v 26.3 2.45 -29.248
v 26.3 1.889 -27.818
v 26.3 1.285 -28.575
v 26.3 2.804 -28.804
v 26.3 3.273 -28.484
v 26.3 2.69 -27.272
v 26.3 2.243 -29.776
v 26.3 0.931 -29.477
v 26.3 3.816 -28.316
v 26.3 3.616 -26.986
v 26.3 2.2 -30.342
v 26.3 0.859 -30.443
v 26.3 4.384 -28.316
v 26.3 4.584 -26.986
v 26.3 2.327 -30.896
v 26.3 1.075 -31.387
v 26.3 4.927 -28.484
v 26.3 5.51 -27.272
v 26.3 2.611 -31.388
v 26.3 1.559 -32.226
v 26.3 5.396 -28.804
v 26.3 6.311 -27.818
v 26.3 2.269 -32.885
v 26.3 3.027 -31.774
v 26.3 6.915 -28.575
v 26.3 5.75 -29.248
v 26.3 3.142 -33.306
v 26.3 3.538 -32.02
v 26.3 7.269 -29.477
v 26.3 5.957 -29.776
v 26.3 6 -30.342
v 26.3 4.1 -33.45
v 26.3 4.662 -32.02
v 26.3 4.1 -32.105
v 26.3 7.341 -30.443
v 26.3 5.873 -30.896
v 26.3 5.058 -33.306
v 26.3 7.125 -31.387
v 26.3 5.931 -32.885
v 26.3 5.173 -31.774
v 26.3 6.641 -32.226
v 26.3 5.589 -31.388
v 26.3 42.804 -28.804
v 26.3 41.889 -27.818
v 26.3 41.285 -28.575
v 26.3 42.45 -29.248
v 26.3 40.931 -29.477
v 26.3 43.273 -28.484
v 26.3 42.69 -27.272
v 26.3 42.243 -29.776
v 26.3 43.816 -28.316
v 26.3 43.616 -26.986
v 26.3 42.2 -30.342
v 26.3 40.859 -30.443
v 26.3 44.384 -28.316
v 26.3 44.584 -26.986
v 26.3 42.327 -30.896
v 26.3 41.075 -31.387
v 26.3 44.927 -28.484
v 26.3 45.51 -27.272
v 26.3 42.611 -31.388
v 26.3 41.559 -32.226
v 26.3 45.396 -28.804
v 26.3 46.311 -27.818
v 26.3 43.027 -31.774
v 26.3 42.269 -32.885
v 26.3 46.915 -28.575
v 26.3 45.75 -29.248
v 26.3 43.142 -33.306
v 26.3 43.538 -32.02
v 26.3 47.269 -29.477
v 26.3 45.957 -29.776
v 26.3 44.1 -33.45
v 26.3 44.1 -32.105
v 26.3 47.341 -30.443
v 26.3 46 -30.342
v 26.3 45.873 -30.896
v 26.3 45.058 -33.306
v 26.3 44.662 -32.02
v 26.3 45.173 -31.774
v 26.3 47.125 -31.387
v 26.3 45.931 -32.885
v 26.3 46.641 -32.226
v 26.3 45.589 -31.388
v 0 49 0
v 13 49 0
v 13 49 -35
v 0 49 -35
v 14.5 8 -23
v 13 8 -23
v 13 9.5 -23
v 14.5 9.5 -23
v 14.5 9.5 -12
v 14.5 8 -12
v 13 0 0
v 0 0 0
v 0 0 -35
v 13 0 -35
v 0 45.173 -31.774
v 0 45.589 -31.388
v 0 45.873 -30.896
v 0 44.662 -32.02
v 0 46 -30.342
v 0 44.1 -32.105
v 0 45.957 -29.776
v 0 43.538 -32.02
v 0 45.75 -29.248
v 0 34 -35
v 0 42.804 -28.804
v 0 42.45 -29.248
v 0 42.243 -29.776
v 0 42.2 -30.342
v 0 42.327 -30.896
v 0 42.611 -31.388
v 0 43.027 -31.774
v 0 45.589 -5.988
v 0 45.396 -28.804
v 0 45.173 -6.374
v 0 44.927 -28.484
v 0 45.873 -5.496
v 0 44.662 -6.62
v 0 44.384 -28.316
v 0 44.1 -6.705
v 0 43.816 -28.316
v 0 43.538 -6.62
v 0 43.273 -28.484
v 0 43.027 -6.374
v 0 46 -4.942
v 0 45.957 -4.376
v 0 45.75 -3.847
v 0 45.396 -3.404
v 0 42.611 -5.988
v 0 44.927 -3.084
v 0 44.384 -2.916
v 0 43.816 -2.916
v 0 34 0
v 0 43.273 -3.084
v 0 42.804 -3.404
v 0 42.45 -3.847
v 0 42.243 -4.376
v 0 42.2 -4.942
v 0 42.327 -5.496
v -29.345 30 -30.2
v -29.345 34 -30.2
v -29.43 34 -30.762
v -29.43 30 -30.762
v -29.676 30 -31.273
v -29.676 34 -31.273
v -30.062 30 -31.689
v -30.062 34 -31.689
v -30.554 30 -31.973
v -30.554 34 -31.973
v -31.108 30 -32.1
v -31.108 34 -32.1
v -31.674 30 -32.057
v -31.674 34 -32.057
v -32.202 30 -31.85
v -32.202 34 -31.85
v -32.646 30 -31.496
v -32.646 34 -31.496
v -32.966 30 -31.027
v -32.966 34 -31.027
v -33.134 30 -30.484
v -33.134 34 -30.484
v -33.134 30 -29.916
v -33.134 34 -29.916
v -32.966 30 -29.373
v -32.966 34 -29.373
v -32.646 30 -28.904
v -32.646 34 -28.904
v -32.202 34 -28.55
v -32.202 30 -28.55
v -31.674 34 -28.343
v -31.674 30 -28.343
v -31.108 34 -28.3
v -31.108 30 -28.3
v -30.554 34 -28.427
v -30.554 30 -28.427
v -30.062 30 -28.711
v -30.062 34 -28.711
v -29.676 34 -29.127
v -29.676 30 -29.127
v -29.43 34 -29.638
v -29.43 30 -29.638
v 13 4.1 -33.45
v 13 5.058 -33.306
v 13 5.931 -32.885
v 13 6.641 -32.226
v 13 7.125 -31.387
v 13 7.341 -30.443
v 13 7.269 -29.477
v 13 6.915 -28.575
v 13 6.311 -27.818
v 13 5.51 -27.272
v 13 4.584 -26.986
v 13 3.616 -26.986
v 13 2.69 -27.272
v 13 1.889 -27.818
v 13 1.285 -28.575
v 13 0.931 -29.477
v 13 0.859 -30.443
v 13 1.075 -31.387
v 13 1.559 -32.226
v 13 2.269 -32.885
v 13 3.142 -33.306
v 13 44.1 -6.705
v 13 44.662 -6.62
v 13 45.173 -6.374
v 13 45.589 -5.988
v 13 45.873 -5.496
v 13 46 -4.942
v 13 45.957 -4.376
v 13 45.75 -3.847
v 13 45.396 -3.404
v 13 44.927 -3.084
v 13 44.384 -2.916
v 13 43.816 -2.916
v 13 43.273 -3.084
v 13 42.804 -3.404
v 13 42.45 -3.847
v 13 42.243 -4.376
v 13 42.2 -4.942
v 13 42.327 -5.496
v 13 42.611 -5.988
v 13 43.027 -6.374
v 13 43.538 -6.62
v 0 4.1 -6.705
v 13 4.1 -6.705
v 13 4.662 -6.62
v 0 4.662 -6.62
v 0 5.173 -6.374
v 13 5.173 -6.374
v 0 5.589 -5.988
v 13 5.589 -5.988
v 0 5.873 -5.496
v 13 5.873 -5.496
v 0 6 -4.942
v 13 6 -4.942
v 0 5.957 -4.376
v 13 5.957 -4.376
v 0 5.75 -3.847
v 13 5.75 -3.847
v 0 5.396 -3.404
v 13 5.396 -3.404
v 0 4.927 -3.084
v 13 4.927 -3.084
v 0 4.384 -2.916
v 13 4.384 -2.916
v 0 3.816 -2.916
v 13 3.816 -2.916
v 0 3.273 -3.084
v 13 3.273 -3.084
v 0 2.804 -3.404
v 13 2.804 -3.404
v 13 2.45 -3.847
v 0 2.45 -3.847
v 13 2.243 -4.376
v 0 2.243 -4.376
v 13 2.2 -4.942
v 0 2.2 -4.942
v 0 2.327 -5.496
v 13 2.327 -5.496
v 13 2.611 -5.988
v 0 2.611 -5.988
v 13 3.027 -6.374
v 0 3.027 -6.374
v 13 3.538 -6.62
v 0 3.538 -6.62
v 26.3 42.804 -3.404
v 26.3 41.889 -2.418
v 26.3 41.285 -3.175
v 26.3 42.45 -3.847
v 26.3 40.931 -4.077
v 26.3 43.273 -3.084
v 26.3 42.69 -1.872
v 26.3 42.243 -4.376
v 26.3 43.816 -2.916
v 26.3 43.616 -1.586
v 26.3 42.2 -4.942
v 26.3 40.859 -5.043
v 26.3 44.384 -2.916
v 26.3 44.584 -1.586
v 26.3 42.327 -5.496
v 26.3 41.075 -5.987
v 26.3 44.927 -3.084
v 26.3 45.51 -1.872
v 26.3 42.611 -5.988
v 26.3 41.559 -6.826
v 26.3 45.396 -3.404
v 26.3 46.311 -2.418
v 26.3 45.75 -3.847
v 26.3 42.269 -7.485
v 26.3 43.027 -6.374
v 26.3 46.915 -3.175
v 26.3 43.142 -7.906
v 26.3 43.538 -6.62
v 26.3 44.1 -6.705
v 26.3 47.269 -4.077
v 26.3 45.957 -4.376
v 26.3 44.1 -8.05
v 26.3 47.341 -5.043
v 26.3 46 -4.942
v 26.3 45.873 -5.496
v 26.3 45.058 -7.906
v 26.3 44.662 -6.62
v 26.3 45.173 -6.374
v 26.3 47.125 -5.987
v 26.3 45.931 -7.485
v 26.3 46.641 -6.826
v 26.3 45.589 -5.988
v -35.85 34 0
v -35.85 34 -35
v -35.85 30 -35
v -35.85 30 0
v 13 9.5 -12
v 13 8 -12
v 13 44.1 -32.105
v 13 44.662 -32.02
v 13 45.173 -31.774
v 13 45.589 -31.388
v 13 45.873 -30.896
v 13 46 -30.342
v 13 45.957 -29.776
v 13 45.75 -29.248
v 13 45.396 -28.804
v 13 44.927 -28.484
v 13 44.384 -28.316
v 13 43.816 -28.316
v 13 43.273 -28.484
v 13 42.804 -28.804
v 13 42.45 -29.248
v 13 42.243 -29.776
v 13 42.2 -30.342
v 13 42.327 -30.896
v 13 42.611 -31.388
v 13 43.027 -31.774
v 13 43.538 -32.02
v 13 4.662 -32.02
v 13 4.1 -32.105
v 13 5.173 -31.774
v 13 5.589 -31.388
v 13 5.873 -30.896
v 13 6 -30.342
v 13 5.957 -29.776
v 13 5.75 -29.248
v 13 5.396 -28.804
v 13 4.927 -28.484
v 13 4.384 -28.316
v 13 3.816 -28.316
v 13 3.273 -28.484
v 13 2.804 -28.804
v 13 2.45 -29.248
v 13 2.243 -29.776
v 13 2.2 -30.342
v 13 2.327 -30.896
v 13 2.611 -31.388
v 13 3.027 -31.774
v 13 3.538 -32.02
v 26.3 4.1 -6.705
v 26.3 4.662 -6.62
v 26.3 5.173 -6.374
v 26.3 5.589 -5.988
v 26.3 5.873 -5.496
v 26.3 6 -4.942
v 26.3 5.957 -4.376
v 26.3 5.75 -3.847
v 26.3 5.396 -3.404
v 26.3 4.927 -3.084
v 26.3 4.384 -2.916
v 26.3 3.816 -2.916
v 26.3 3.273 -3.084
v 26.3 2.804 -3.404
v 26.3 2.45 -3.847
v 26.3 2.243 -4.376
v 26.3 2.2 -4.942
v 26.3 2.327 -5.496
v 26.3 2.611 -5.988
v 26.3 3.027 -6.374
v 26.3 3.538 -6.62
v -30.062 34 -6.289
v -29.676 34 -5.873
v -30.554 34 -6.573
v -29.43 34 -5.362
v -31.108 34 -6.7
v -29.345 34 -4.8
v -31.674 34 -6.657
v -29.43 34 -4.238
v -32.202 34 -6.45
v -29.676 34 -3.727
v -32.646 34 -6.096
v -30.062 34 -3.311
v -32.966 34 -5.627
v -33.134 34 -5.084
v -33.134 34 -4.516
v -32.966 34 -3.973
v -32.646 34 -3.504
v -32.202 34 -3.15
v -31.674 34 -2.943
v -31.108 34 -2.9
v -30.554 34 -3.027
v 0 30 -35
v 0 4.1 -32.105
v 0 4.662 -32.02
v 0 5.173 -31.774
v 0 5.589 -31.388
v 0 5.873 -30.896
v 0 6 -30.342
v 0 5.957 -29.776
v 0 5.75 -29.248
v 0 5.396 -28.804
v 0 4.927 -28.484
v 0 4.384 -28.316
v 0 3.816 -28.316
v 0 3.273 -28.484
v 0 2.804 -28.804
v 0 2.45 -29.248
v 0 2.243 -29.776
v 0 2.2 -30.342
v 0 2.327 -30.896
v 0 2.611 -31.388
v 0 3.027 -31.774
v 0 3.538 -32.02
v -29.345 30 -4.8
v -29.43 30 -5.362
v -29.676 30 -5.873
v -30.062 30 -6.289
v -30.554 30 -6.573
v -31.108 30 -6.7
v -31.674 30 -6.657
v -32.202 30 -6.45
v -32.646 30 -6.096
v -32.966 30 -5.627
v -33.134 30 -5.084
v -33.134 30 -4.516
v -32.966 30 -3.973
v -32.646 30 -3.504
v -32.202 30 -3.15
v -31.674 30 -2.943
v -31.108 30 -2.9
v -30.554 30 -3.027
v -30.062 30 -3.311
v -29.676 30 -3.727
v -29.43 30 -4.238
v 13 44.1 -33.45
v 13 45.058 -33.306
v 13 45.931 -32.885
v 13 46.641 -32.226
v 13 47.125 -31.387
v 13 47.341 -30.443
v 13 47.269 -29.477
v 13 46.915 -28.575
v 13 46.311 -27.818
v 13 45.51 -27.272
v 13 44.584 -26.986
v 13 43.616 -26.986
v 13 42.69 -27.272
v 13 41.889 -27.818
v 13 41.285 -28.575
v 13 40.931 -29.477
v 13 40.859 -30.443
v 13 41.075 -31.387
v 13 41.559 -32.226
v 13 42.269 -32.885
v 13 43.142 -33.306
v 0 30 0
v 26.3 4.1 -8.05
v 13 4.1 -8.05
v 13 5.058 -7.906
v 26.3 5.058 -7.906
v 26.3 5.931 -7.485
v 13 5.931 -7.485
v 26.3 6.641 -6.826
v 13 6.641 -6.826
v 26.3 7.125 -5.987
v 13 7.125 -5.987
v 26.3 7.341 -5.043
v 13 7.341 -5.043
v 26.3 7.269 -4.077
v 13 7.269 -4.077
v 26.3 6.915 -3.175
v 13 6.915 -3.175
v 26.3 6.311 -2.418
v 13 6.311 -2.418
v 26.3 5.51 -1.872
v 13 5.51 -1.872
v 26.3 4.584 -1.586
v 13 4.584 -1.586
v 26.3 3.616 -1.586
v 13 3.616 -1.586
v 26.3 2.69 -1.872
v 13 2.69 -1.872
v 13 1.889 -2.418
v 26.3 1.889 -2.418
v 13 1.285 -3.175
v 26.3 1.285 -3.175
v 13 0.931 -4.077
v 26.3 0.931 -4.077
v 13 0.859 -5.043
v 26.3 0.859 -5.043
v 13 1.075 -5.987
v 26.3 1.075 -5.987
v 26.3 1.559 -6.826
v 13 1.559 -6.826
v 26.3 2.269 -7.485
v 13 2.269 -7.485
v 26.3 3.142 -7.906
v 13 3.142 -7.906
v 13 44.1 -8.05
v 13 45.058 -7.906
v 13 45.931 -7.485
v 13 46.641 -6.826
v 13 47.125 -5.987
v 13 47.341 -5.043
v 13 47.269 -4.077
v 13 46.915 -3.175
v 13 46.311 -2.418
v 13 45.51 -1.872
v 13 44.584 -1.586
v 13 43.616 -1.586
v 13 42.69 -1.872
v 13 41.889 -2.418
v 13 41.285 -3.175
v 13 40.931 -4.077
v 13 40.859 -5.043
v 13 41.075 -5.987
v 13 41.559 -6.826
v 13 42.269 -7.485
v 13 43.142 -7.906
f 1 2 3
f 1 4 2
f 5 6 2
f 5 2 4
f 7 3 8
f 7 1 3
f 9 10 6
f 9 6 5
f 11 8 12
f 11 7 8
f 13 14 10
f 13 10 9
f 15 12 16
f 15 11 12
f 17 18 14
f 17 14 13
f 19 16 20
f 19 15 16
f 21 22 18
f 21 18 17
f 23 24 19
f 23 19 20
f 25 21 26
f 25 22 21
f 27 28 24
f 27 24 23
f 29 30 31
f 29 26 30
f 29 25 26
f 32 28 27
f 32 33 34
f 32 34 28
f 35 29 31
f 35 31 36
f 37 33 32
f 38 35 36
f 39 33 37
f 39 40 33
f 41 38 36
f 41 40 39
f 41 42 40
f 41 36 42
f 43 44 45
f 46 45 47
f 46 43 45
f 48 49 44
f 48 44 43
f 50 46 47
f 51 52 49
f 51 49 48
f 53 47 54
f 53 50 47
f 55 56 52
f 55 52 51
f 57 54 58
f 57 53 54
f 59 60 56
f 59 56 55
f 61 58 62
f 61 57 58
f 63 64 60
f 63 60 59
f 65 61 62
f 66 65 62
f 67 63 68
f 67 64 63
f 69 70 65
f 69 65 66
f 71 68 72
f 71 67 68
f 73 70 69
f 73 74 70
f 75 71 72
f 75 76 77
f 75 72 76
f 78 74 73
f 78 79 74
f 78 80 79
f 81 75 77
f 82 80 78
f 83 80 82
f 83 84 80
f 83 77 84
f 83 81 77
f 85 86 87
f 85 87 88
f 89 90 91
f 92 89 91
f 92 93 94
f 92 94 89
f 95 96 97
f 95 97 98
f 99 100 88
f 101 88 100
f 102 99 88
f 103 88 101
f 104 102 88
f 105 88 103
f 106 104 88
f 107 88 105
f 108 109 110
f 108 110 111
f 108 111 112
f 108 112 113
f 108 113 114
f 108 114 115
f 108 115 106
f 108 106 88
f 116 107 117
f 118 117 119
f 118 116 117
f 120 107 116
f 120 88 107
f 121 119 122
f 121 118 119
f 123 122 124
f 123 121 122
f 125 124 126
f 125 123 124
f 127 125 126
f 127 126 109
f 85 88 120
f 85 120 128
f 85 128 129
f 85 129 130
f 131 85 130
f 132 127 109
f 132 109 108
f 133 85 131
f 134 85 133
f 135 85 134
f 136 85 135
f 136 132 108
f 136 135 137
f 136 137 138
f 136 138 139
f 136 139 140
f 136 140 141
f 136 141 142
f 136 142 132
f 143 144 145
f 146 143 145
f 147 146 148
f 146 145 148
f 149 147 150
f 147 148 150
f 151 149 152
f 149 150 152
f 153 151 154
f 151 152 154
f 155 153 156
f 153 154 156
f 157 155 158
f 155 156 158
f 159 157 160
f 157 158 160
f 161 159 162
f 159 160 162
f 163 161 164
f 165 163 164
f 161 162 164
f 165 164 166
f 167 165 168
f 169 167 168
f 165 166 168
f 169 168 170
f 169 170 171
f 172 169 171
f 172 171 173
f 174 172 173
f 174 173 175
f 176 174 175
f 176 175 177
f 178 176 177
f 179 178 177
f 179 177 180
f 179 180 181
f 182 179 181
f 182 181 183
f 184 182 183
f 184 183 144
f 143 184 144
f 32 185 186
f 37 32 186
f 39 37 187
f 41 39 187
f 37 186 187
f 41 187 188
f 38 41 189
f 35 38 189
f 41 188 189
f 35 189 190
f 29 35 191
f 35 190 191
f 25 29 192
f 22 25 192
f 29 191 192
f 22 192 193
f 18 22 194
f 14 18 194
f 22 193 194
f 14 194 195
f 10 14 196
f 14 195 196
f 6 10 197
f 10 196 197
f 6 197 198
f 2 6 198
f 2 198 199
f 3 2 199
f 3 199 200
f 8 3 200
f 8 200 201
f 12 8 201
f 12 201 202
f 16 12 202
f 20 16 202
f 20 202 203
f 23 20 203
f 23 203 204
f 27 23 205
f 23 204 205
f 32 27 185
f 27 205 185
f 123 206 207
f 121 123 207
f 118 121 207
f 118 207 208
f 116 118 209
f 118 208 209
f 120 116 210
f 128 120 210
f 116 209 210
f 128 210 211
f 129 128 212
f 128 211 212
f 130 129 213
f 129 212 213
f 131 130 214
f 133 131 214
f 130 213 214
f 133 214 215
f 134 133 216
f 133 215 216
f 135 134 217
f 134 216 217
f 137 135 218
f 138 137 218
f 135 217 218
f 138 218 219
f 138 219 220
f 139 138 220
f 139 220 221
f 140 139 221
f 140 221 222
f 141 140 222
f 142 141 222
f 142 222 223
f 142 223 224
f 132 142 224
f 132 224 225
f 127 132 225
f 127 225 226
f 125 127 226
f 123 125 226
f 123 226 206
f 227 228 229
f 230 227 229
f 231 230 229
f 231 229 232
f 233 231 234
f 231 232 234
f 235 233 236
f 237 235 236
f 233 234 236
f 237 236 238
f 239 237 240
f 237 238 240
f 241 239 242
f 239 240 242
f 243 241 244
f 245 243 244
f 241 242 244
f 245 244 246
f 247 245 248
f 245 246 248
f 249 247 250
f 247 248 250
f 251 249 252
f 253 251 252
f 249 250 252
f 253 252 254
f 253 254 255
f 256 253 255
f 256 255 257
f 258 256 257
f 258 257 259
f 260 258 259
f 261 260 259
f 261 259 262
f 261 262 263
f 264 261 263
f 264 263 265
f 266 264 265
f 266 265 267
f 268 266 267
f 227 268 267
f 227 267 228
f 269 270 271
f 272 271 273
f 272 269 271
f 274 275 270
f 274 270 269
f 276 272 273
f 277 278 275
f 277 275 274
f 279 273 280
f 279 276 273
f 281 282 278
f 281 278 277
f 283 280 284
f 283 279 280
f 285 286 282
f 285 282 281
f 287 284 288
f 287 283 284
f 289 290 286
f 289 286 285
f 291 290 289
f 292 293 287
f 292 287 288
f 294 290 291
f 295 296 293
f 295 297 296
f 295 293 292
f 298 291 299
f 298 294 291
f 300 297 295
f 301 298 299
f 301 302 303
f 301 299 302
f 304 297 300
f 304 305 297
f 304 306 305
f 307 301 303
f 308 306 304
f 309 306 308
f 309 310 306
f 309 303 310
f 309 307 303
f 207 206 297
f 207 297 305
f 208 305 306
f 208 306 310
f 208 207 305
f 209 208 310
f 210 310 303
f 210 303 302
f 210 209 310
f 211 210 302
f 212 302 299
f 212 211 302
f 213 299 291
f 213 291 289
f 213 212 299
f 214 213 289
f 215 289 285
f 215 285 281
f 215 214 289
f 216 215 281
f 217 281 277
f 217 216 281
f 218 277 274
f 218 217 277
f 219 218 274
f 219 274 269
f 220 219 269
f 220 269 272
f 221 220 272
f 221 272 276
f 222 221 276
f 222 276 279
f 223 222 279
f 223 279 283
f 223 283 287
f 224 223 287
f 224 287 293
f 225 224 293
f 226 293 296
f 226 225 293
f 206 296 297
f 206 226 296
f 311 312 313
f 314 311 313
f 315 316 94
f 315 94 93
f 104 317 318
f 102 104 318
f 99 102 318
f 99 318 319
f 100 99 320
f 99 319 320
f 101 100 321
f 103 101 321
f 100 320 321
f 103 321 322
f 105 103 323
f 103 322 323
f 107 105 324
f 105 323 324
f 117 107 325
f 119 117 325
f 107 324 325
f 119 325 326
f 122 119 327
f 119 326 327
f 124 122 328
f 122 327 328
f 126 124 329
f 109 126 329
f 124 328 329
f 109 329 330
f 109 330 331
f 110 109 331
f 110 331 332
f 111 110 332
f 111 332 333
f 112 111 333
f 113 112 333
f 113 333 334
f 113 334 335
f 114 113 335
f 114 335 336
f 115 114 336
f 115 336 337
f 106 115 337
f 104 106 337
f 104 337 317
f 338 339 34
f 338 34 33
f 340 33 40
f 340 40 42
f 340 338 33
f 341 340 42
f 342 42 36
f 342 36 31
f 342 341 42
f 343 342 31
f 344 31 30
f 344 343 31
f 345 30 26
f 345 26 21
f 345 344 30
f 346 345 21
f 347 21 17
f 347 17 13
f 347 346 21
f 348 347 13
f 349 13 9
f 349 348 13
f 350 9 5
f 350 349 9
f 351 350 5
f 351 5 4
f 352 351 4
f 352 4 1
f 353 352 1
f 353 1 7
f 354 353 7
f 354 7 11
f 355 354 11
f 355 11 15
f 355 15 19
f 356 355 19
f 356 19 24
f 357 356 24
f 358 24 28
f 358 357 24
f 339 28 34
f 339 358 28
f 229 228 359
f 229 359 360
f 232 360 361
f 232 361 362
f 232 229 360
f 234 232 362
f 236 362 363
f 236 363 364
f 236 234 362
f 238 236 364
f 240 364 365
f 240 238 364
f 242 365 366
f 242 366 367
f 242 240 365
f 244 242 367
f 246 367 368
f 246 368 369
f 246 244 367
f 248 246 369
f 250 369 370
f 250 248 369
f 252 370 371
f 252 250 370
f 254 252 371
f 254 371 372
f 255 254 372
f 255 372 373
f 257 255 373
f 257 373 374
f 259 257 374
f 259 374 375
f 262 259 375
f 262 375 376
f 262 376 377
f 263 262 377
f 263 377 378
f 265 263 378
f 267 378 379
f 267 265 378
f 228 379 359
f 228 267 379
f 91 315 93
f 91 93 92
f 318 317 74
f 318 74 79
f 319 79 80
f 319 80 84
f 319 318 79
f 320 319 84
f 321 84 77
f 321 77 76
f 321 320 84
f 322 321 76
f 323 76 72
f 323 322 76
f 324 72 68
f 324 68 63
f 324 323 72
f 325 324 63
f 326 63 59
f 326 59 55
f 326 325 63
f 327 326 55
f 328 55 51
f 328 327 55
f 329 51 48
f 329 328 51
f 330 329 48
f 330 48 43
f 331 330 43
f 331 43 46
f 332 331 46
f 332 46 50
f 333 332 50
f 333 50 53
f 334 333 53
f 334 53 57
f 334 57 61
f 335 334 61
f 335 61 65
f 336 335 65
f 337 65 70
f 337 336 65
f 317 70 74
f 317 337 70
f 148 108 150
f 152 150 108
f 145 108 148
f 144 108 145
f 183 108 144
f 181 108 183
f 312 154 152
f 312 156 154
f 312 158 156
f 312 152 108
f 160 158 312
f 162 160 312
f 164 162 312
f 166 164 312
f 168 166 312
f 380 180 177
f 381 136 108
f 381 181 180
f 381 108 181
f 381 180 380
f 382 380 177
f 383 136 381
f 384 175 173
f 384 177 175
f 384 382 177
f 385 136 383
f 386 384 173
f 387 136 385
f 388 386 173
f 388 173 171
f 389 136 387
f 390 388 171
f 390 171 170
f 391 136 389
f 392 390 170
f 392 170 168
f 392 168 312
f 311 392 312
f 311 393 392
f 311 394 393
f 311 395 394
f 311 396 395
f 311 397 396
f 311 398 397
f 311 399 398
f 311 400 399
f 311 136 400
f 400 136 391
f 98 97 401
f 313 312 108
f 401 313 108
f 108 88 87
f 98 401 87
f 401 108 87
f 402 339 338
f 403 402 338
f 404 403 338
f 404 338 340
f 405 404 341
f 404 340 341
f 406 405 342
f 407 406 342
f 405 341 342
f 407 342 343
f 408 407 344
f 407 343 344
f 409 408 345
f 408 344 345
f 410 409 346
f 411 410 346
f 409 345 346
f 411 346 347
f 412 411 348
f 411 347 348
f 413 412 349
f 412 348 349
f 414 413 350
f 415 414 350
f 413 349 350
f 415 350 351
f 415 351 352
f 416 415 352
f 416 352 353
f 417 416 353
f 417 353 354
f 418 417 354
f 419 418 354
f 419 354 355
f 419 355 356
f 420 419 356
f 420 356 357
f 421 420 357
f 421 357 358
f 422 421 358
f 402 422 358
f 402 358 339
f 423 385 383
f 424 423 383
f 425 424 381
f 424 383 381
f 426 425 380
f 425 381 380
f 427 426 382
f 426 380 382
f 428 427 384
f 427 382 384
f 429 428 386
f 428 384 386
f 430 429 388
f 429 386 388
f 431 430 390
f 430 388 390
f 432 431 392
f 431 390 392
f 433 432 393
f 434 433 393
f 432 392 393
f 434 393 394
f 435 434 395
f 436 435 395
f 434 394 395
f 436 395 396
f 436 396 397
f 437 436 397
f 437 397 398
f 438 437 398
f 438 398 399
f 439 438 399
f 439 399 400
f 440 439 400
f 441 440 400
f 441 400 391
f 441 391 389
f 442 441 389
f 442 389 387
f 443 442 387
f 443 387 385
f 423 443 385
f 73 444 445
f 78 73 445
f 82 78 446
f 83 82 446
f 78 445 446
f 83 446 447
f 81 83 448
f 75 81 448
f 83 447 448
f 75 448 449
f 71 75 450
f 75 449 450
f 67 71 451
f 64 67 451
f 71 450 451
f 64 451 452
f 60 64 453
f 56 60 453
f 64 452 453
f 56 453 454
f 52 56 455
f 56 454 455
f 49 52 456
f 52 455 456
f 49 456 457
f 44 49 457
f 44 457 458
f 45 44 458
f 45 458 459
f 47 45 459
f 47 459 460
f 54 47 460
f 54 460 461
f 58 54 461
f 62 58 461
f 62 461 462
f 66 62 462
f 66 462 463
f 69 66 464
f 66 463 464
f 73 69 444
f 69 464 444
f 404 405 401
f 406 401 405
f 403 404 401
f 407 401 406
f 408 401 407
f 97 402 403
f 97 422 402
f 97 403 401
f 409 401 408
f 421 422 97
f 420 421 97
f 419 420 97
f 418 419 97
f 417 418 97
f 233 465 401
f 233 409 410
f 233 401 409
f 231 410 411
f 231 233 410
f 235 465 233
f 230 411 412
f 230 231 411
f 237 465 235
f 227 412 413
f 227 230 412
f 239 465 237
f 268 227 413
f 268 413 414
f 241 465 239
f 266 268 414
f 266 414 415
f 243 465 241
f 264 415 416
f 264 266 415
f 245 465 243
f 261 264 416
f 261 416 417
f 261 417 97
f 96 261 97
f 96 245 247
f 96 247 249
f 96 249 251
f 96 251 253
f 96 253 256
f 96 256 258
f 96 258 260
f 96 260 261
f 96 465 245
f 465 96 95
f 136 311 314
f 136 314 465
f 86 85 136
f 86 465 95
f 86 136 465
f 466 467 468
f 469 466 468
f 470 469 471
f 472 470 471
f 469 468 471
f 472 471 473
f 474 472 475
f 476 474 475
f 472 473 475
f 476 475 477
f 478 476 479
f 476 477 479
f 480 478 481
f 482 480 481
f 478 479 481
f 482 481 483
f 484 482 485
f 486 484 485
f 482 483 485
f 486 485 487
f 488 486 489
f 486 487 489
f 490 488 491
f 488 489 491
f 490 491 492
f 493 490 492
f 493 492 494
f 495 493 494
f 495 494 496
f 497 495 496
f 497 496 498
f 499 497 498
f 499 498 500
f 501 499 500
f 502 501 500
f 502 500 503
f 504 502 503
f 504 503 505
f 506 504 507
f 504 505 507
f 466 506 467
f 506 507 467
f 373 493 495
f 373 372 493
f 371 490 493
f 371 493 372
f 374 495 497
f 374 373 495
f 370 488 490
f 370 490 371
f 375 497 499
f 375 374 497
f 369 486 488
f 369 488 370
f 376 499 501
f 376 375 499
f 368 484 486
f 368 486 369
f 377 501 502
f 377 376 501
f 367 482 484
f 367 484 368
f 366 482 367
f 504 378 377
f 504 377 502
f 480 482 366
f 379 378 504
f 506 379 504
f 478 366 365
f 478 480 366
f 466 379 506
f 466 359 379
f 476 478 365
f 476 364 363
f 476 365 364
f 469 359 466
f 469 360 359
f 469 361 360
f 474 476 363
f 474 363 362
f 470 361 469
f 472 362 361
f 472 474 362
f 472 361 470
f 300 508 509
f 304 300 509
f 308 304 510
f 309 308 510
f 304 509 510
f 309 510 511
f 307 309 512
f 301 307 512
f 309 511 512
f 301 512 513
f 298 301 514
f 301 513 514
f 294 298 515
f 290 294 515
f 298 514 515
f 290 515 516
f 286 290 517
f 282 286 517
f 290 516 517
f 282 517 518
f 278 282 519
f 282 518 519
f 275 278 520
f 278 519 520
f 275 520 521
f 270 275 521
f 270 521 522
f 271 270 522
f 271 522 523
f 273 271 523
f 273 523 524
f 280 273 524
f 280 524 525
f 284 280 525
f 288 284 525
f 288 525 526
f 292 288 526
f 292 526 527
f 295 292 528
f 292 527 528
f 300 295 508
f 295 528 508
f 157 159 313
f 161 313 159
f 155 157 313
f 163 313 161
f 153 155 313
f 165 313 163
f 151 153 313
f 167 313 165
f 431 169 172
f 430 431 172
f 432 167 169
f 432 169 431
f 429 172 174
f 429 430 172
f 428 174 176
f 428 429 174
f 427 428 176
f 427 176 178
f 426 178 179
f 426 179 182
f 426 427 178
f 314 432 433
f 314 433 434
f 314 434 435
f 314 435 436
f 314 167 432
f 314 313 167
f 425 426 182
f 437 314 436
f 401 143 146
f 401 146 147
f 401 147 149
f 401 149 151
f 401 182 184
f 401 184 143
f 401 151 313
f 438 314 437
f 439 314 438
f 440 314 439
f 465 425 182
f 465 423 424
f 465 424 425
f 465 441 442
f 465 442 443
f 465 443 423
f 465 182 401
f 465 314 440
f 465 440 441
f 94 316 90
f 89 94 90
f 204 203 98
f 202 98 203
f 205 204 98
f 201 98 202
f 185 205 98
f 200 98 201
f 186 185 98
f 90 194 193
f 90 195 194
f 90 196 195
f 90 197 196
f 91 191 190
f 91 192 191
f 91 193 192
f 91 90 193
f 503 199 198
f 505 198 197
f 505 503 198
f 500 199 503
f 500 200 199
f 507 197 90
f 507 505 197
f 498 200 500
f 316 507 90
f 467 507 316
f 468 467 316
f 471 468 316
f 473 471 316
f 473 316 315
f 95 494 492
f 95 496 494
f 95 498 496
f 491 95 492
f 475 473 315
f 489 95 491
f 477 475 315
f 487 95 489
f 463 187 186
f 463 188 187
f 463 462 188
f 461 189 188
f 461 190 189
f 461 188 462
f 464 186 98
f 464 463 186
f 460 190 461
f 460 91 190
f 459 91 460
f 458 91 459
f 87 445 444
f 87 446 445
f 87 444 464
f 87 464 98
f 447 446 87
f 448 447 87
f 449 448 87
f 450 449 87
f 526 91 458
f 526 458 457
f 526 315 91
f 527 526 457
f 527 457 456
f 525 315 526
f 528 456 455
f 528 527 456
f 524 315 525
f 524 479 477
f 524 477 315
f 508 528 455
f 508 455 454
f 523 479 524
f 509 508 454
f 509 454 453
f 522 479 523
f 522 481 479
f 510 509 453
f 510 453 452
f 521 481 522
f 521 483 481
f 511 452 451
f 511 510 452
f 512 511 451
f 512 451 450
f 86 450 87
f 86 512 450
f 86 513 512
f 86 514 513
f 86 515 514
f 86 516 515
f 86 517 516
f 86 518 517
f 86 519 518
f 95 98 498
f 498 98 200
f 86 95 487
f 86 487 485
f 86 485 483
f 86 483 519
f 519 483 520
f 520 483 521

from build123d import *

# Parameters (mm, degrees)
BOSS_EXTRUDE1_DEPTH = 35
SKETCH5_R           = 1.905
CUT_EXTRUDE1_DEPTH  = 35
SKETCH2_R           = 1.905
CUT_EXTRUDE2_DEPTH  = 49.85
SKETCH7_W           = 11
SKETCH7_H           = 1.5
BOSS_EXTRUDE3_DEPTH = 1.5
SKETCH8_R           = 1.905
CUT_EXTRUDE3_DEPTH  = 49.85
SKETCH11_R          = 3.25
SKETCH11_R_2        = 1.905
BOSS_EXTRUDE4_DEPTH = 13.3


with BuildPart() as part:
    # Sketch1 → Boss-Extrude1 (new body)
    with BuildSketch(Plane.XY):
        Polygon((0, 0), (13, 0), (13, 34), (13, 49), (0, 49), (0, 34), (-35.85, 34), (-35.85, 30), (0, 30), align=None)
    extrude(amount=-BOSS_EXTRUDE1_DEPTH)

    # Sketch5 → Cut-Extrude1 (cut, through all)
    with BuildSketch(Plane(origin=(0, 34, 0), x_dir=(1, 0, 0), z_dir=(0, 1, 0))):
        with Locations((-31.25, 4.8)):
            Circle(SKETCH5_R)
        with Locations((-31.25, 30.2)):
            Circle(SKETCH5_R)
    extrude(amount=-CUT_EXTRUDE1_DEPTH, mode=Mode.SUBTRACT)

    # Sketch2 → Cut-Extrude2 (cut, through all)
    with BuildSketch(Plane(origin=(13, 0, 0), x_dir=(0, 0, -1), z_dir=(1, 0, 0))):
        with Locations((4.8, 4.1)):
            Circle(SKETCH2_R)
        with Locations((30.2, 4.1)):
            Circle(SKETCH2_R)
    extrude(amount=-CUT_EXTRUDE2_DEPTH, mode=Mode.SUBTRACT)

    # Sketch7 → Boss-Extrude3 (add)
    with BuildSketch(Plane(origin=(13, 0, 0), x_dir=(0, 0, -1), z_dir=(1, 0, 0))):
        with Locations((17.5, 8.75)):
            Rectangle(SKETCH7_W, SKETCH7_H)
    extrude(amount=BOSS_EXTRUDE3_DEPTH)

    # Sketch8 → Cut-Extrude3 (cut, through all)
    with BuildSketch(Plane(origin=(13, 0, 0), x_dir=(0, 0, -1), z_dir=(1, 0, 0))):
        with Locations((4.8, 44.1)):
            Circle(SKETCH8_R)
        with Locations((30.2, 44.1)):
            Circle(SKETCH8_R)
    extrude(amount=-CUT_EXTRUDE3_DEPTH, mode=Mode.SUBTRACT)

    # Sketch11 → Boss-Extrude4 (add)
    with BuildSketch(Plane(origin=(13, 0, 0), x_dir=(0, 0, -1), z_dir=(1, 0, 0))):
        with Locations((4.8, 44.1)):
            Circle(SKETCH11_R)
        with Locations((4.8, 44.1)):
            Circle(SKETCH11_R_2, mode=Mode.SUBTRACT)
        with Locations((30.2, 44.1)):
            Circle(SKETCH11_R)
        with Locations((30.2, 44.1)):
            Circle(SKETCH11_R_2, mode=Mode.SUBTRACT)
        with Locations((30.2, 4.1)):
            Circle(SKETCH11_R)
        with Locations((30.2, 4.1)):
            Circle(SKETCH11_R_2, mode=Mode.SUBTRACT)
        with Locations((4.8, 4.1)):
            Circle(SKETCH11_R)
        with Locations((4.8, 4.1)):
            Circle(SKETCH11_R_2, mode=Mode.SUBTRACT)
    extrude(amount=BOSS_EXTRUDE4_DEPTH)


solid = part.part
